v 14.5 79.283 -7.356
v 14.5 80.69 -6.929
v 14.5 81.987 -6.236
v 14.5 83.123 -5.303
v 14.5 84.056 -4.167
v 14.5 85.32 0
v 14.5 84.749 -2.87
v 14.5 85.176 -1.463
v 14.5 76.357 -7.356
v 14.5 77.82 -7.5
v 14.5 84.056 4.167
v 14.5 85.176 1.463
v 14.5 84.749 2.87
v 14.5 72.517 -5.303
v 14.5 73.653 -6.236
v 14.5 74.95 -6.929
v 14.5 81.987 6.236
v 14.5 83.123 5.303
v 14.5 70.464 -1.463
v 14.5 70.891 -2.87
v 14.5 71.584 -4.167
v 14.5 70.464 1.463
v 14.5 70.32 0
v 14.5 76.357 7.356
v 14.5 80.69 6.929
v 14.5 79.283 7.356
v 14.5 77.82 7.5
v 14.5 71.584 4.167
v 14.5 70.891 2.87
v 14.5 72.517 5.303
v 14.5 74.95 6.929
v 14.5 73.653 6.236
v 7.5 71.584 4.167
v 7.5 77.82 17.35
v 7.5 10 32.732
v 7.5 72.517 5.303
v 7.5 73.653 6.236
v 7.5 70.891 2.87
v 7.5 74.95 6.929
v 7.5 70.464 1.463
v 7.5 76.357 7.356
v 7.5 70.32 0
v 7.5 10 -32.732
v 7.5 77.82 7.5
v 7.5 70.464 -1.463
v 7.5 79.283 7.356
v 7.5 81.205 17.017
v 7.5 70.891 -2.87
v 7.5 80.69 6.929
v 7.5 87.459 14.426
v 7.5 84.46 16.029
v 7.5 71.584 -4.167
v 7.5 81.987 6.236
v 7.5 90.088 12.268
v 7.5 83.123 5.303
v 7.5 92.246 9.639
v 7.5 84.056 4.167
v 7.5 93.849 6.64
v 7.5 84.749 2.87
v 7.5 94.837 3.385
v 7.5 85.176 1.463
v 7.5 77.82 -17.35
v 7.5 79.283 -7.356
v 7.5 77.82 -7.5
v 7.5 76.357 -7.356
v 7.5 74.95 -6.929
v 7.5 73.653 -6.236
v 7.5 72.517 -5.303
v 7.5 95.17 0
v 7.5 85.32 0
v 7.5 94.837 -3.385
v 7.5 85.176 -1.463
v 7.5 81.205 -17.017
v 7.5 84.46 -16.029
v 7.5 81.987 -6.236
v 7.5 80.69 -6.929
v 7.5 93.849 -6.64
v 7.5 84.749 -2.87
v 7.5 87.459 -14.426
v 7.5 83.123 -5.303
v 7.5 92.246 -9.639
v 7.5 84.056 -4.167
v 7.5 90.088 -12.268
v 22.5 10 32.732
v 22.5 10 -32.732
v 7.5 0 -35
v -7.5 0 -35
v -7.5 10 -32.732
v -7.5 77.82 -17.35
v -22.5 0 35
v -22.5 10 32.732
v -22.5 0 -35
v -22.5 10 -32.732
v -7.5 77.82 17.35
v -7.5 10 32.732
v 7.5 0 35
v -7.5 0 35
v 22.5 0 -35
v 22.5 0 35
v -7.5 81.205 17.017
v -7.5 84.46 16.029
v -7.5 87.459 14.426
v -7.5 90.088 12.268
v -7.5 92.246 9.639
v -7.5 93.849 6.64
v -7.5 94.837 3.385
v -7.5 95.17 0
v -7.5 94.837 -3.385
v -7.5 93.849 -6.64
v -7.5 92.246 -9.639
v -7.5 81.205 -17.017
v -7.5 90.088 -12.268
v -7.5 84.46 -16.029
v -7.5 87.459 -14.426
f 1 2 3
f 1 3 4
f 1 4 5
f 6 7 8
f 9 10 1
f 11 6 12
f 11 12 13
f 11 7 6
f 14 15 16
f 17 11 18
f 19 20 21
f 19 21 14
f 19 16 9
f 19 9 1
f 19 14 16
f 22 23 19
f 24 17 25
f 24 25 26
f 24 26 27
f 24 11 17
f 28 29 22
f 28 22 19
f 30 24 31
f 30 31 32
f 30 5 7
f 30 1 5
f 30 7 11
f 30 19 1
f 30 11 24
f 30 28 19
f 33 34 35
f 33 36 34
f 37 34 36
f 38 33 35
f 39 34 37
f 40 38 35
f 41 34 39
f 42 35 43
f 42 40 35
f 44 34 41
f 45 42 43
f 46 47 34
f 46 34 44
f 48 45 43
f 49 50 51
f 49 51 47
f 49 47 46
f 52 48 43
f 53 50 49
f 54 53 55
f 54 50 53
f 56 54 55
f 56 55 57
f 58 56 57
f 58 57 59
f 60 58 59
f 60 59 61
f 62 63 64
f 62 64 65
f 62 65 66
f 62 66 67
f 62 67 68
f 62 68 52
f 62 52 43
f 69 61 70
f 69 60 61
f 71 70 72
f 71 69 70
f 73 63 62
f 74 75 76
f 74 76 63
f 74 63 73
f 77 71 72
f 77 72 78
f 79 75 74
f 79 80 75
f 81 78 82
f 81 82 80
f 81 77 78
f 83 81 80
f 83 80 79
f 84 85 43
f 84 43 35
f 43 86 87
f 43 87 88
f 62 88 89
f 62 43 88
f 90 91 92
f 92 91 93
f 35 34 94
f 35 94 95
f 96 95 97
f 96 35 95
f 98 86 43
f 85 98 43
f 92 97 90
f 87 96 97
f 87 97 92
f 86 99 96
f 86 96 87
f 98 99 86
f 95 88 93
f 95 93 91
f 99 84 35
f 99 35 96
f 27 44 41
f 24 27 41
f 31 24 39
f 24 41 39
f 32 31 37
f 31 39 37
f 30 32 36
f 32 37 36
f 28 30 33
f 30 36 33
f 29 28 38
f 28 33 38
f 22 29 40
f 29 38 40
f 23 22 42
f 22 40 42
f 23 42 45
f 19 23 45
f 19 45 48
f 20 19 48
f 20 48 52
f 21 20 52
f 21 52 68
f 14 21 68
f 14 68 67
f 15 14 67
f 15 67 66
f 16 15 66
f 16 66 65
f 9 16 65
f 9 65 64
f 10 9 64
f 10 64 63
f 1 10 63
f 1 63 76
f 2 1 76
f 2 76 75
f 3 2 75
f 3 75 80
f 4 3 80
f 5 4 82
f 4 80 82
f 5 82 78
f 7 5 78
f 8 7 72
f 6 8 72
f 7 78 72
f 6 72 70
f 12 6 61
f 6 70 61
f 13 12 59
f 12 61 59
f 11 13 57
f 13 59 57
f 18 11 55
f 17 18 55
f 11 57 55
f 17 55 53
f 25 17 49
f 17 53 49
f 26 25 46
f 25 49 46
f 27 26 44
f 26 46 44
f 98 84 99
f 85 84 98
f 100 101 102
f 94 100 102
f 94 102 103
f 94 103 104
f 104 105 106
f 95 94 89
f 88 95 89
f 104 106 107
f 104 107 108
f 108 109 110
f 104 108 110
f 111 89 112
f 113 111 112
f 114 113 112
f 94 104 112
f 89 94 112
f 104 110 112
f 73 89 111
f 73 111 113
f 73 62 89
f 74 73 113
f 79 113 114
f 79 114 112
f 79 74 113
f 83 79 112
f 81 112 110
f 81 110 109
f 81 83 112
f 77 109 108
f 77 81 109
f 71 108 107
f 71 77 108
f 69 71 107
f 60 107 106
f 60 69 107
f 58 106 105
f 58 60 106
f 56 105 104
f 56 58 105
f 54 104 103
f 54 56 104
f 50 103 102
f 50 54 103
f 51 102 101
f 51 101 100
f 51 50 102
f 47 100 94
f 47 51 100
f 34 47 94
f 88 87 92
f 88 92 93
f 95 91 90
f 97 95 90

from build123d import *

# Parameters (mm, degrees)
BOSS_EXTRUDE1_DEPTH = 7.5
BOSS_EXTRUDE2_DEPTH = 22.5
SKETCH1_4_R         = 7.5
BOSS_EXTRUDE3_DEPTH = 14.5


with BuildPart() as part:
    # Sketch1 → Boss-Extrude1 (new, symmetric)
    with BuildSketch(Plane(origin=(0, 0, 0), x_dir=(0, 0, -1), z_dir=(1, 0, 0))):
        with BuildLine():
            Line((-17.35, 77.82), (-35, 0))
            Line((-35, 0), (35, 0))
            Line((35, 0), (17.35, 77.82))
            ThreePointArc((17.35, 77.82), (0, 95.17), (-17.35, 77.82))
        make_face()
    extrude(amount=BOSS_EXTRUDE1_DEPTH, both=True)

    # Sketch1<3> → Boss-Extrude2 (add, symmetric)
    with BuildSketch(Plane(origin=(0, 0, 0), x_dir=(0, 0, -1), z_dir=(1, 0, 0))):
        Polygon((-32.731945515, 10), (-35, 0), (35, 0), (32.731945515, 10), align=None)
    extrude(amount=BOSS_EXTRUDE2_DEPTH, both=True)

    # Sketch1<4> → Boss-Extrude3 (add)
    with BuildSketch(Plane(origin=(0, 0, 0), x_dir=(0, 0, -1), z_dir=(1, 0, 0))):
        with Locations((0, 77.82)):
            Circle(SKETCH1_4_R)
    extrude(amount=BOSS_EXTRUDE3_DEPTH)


solid = part.part
